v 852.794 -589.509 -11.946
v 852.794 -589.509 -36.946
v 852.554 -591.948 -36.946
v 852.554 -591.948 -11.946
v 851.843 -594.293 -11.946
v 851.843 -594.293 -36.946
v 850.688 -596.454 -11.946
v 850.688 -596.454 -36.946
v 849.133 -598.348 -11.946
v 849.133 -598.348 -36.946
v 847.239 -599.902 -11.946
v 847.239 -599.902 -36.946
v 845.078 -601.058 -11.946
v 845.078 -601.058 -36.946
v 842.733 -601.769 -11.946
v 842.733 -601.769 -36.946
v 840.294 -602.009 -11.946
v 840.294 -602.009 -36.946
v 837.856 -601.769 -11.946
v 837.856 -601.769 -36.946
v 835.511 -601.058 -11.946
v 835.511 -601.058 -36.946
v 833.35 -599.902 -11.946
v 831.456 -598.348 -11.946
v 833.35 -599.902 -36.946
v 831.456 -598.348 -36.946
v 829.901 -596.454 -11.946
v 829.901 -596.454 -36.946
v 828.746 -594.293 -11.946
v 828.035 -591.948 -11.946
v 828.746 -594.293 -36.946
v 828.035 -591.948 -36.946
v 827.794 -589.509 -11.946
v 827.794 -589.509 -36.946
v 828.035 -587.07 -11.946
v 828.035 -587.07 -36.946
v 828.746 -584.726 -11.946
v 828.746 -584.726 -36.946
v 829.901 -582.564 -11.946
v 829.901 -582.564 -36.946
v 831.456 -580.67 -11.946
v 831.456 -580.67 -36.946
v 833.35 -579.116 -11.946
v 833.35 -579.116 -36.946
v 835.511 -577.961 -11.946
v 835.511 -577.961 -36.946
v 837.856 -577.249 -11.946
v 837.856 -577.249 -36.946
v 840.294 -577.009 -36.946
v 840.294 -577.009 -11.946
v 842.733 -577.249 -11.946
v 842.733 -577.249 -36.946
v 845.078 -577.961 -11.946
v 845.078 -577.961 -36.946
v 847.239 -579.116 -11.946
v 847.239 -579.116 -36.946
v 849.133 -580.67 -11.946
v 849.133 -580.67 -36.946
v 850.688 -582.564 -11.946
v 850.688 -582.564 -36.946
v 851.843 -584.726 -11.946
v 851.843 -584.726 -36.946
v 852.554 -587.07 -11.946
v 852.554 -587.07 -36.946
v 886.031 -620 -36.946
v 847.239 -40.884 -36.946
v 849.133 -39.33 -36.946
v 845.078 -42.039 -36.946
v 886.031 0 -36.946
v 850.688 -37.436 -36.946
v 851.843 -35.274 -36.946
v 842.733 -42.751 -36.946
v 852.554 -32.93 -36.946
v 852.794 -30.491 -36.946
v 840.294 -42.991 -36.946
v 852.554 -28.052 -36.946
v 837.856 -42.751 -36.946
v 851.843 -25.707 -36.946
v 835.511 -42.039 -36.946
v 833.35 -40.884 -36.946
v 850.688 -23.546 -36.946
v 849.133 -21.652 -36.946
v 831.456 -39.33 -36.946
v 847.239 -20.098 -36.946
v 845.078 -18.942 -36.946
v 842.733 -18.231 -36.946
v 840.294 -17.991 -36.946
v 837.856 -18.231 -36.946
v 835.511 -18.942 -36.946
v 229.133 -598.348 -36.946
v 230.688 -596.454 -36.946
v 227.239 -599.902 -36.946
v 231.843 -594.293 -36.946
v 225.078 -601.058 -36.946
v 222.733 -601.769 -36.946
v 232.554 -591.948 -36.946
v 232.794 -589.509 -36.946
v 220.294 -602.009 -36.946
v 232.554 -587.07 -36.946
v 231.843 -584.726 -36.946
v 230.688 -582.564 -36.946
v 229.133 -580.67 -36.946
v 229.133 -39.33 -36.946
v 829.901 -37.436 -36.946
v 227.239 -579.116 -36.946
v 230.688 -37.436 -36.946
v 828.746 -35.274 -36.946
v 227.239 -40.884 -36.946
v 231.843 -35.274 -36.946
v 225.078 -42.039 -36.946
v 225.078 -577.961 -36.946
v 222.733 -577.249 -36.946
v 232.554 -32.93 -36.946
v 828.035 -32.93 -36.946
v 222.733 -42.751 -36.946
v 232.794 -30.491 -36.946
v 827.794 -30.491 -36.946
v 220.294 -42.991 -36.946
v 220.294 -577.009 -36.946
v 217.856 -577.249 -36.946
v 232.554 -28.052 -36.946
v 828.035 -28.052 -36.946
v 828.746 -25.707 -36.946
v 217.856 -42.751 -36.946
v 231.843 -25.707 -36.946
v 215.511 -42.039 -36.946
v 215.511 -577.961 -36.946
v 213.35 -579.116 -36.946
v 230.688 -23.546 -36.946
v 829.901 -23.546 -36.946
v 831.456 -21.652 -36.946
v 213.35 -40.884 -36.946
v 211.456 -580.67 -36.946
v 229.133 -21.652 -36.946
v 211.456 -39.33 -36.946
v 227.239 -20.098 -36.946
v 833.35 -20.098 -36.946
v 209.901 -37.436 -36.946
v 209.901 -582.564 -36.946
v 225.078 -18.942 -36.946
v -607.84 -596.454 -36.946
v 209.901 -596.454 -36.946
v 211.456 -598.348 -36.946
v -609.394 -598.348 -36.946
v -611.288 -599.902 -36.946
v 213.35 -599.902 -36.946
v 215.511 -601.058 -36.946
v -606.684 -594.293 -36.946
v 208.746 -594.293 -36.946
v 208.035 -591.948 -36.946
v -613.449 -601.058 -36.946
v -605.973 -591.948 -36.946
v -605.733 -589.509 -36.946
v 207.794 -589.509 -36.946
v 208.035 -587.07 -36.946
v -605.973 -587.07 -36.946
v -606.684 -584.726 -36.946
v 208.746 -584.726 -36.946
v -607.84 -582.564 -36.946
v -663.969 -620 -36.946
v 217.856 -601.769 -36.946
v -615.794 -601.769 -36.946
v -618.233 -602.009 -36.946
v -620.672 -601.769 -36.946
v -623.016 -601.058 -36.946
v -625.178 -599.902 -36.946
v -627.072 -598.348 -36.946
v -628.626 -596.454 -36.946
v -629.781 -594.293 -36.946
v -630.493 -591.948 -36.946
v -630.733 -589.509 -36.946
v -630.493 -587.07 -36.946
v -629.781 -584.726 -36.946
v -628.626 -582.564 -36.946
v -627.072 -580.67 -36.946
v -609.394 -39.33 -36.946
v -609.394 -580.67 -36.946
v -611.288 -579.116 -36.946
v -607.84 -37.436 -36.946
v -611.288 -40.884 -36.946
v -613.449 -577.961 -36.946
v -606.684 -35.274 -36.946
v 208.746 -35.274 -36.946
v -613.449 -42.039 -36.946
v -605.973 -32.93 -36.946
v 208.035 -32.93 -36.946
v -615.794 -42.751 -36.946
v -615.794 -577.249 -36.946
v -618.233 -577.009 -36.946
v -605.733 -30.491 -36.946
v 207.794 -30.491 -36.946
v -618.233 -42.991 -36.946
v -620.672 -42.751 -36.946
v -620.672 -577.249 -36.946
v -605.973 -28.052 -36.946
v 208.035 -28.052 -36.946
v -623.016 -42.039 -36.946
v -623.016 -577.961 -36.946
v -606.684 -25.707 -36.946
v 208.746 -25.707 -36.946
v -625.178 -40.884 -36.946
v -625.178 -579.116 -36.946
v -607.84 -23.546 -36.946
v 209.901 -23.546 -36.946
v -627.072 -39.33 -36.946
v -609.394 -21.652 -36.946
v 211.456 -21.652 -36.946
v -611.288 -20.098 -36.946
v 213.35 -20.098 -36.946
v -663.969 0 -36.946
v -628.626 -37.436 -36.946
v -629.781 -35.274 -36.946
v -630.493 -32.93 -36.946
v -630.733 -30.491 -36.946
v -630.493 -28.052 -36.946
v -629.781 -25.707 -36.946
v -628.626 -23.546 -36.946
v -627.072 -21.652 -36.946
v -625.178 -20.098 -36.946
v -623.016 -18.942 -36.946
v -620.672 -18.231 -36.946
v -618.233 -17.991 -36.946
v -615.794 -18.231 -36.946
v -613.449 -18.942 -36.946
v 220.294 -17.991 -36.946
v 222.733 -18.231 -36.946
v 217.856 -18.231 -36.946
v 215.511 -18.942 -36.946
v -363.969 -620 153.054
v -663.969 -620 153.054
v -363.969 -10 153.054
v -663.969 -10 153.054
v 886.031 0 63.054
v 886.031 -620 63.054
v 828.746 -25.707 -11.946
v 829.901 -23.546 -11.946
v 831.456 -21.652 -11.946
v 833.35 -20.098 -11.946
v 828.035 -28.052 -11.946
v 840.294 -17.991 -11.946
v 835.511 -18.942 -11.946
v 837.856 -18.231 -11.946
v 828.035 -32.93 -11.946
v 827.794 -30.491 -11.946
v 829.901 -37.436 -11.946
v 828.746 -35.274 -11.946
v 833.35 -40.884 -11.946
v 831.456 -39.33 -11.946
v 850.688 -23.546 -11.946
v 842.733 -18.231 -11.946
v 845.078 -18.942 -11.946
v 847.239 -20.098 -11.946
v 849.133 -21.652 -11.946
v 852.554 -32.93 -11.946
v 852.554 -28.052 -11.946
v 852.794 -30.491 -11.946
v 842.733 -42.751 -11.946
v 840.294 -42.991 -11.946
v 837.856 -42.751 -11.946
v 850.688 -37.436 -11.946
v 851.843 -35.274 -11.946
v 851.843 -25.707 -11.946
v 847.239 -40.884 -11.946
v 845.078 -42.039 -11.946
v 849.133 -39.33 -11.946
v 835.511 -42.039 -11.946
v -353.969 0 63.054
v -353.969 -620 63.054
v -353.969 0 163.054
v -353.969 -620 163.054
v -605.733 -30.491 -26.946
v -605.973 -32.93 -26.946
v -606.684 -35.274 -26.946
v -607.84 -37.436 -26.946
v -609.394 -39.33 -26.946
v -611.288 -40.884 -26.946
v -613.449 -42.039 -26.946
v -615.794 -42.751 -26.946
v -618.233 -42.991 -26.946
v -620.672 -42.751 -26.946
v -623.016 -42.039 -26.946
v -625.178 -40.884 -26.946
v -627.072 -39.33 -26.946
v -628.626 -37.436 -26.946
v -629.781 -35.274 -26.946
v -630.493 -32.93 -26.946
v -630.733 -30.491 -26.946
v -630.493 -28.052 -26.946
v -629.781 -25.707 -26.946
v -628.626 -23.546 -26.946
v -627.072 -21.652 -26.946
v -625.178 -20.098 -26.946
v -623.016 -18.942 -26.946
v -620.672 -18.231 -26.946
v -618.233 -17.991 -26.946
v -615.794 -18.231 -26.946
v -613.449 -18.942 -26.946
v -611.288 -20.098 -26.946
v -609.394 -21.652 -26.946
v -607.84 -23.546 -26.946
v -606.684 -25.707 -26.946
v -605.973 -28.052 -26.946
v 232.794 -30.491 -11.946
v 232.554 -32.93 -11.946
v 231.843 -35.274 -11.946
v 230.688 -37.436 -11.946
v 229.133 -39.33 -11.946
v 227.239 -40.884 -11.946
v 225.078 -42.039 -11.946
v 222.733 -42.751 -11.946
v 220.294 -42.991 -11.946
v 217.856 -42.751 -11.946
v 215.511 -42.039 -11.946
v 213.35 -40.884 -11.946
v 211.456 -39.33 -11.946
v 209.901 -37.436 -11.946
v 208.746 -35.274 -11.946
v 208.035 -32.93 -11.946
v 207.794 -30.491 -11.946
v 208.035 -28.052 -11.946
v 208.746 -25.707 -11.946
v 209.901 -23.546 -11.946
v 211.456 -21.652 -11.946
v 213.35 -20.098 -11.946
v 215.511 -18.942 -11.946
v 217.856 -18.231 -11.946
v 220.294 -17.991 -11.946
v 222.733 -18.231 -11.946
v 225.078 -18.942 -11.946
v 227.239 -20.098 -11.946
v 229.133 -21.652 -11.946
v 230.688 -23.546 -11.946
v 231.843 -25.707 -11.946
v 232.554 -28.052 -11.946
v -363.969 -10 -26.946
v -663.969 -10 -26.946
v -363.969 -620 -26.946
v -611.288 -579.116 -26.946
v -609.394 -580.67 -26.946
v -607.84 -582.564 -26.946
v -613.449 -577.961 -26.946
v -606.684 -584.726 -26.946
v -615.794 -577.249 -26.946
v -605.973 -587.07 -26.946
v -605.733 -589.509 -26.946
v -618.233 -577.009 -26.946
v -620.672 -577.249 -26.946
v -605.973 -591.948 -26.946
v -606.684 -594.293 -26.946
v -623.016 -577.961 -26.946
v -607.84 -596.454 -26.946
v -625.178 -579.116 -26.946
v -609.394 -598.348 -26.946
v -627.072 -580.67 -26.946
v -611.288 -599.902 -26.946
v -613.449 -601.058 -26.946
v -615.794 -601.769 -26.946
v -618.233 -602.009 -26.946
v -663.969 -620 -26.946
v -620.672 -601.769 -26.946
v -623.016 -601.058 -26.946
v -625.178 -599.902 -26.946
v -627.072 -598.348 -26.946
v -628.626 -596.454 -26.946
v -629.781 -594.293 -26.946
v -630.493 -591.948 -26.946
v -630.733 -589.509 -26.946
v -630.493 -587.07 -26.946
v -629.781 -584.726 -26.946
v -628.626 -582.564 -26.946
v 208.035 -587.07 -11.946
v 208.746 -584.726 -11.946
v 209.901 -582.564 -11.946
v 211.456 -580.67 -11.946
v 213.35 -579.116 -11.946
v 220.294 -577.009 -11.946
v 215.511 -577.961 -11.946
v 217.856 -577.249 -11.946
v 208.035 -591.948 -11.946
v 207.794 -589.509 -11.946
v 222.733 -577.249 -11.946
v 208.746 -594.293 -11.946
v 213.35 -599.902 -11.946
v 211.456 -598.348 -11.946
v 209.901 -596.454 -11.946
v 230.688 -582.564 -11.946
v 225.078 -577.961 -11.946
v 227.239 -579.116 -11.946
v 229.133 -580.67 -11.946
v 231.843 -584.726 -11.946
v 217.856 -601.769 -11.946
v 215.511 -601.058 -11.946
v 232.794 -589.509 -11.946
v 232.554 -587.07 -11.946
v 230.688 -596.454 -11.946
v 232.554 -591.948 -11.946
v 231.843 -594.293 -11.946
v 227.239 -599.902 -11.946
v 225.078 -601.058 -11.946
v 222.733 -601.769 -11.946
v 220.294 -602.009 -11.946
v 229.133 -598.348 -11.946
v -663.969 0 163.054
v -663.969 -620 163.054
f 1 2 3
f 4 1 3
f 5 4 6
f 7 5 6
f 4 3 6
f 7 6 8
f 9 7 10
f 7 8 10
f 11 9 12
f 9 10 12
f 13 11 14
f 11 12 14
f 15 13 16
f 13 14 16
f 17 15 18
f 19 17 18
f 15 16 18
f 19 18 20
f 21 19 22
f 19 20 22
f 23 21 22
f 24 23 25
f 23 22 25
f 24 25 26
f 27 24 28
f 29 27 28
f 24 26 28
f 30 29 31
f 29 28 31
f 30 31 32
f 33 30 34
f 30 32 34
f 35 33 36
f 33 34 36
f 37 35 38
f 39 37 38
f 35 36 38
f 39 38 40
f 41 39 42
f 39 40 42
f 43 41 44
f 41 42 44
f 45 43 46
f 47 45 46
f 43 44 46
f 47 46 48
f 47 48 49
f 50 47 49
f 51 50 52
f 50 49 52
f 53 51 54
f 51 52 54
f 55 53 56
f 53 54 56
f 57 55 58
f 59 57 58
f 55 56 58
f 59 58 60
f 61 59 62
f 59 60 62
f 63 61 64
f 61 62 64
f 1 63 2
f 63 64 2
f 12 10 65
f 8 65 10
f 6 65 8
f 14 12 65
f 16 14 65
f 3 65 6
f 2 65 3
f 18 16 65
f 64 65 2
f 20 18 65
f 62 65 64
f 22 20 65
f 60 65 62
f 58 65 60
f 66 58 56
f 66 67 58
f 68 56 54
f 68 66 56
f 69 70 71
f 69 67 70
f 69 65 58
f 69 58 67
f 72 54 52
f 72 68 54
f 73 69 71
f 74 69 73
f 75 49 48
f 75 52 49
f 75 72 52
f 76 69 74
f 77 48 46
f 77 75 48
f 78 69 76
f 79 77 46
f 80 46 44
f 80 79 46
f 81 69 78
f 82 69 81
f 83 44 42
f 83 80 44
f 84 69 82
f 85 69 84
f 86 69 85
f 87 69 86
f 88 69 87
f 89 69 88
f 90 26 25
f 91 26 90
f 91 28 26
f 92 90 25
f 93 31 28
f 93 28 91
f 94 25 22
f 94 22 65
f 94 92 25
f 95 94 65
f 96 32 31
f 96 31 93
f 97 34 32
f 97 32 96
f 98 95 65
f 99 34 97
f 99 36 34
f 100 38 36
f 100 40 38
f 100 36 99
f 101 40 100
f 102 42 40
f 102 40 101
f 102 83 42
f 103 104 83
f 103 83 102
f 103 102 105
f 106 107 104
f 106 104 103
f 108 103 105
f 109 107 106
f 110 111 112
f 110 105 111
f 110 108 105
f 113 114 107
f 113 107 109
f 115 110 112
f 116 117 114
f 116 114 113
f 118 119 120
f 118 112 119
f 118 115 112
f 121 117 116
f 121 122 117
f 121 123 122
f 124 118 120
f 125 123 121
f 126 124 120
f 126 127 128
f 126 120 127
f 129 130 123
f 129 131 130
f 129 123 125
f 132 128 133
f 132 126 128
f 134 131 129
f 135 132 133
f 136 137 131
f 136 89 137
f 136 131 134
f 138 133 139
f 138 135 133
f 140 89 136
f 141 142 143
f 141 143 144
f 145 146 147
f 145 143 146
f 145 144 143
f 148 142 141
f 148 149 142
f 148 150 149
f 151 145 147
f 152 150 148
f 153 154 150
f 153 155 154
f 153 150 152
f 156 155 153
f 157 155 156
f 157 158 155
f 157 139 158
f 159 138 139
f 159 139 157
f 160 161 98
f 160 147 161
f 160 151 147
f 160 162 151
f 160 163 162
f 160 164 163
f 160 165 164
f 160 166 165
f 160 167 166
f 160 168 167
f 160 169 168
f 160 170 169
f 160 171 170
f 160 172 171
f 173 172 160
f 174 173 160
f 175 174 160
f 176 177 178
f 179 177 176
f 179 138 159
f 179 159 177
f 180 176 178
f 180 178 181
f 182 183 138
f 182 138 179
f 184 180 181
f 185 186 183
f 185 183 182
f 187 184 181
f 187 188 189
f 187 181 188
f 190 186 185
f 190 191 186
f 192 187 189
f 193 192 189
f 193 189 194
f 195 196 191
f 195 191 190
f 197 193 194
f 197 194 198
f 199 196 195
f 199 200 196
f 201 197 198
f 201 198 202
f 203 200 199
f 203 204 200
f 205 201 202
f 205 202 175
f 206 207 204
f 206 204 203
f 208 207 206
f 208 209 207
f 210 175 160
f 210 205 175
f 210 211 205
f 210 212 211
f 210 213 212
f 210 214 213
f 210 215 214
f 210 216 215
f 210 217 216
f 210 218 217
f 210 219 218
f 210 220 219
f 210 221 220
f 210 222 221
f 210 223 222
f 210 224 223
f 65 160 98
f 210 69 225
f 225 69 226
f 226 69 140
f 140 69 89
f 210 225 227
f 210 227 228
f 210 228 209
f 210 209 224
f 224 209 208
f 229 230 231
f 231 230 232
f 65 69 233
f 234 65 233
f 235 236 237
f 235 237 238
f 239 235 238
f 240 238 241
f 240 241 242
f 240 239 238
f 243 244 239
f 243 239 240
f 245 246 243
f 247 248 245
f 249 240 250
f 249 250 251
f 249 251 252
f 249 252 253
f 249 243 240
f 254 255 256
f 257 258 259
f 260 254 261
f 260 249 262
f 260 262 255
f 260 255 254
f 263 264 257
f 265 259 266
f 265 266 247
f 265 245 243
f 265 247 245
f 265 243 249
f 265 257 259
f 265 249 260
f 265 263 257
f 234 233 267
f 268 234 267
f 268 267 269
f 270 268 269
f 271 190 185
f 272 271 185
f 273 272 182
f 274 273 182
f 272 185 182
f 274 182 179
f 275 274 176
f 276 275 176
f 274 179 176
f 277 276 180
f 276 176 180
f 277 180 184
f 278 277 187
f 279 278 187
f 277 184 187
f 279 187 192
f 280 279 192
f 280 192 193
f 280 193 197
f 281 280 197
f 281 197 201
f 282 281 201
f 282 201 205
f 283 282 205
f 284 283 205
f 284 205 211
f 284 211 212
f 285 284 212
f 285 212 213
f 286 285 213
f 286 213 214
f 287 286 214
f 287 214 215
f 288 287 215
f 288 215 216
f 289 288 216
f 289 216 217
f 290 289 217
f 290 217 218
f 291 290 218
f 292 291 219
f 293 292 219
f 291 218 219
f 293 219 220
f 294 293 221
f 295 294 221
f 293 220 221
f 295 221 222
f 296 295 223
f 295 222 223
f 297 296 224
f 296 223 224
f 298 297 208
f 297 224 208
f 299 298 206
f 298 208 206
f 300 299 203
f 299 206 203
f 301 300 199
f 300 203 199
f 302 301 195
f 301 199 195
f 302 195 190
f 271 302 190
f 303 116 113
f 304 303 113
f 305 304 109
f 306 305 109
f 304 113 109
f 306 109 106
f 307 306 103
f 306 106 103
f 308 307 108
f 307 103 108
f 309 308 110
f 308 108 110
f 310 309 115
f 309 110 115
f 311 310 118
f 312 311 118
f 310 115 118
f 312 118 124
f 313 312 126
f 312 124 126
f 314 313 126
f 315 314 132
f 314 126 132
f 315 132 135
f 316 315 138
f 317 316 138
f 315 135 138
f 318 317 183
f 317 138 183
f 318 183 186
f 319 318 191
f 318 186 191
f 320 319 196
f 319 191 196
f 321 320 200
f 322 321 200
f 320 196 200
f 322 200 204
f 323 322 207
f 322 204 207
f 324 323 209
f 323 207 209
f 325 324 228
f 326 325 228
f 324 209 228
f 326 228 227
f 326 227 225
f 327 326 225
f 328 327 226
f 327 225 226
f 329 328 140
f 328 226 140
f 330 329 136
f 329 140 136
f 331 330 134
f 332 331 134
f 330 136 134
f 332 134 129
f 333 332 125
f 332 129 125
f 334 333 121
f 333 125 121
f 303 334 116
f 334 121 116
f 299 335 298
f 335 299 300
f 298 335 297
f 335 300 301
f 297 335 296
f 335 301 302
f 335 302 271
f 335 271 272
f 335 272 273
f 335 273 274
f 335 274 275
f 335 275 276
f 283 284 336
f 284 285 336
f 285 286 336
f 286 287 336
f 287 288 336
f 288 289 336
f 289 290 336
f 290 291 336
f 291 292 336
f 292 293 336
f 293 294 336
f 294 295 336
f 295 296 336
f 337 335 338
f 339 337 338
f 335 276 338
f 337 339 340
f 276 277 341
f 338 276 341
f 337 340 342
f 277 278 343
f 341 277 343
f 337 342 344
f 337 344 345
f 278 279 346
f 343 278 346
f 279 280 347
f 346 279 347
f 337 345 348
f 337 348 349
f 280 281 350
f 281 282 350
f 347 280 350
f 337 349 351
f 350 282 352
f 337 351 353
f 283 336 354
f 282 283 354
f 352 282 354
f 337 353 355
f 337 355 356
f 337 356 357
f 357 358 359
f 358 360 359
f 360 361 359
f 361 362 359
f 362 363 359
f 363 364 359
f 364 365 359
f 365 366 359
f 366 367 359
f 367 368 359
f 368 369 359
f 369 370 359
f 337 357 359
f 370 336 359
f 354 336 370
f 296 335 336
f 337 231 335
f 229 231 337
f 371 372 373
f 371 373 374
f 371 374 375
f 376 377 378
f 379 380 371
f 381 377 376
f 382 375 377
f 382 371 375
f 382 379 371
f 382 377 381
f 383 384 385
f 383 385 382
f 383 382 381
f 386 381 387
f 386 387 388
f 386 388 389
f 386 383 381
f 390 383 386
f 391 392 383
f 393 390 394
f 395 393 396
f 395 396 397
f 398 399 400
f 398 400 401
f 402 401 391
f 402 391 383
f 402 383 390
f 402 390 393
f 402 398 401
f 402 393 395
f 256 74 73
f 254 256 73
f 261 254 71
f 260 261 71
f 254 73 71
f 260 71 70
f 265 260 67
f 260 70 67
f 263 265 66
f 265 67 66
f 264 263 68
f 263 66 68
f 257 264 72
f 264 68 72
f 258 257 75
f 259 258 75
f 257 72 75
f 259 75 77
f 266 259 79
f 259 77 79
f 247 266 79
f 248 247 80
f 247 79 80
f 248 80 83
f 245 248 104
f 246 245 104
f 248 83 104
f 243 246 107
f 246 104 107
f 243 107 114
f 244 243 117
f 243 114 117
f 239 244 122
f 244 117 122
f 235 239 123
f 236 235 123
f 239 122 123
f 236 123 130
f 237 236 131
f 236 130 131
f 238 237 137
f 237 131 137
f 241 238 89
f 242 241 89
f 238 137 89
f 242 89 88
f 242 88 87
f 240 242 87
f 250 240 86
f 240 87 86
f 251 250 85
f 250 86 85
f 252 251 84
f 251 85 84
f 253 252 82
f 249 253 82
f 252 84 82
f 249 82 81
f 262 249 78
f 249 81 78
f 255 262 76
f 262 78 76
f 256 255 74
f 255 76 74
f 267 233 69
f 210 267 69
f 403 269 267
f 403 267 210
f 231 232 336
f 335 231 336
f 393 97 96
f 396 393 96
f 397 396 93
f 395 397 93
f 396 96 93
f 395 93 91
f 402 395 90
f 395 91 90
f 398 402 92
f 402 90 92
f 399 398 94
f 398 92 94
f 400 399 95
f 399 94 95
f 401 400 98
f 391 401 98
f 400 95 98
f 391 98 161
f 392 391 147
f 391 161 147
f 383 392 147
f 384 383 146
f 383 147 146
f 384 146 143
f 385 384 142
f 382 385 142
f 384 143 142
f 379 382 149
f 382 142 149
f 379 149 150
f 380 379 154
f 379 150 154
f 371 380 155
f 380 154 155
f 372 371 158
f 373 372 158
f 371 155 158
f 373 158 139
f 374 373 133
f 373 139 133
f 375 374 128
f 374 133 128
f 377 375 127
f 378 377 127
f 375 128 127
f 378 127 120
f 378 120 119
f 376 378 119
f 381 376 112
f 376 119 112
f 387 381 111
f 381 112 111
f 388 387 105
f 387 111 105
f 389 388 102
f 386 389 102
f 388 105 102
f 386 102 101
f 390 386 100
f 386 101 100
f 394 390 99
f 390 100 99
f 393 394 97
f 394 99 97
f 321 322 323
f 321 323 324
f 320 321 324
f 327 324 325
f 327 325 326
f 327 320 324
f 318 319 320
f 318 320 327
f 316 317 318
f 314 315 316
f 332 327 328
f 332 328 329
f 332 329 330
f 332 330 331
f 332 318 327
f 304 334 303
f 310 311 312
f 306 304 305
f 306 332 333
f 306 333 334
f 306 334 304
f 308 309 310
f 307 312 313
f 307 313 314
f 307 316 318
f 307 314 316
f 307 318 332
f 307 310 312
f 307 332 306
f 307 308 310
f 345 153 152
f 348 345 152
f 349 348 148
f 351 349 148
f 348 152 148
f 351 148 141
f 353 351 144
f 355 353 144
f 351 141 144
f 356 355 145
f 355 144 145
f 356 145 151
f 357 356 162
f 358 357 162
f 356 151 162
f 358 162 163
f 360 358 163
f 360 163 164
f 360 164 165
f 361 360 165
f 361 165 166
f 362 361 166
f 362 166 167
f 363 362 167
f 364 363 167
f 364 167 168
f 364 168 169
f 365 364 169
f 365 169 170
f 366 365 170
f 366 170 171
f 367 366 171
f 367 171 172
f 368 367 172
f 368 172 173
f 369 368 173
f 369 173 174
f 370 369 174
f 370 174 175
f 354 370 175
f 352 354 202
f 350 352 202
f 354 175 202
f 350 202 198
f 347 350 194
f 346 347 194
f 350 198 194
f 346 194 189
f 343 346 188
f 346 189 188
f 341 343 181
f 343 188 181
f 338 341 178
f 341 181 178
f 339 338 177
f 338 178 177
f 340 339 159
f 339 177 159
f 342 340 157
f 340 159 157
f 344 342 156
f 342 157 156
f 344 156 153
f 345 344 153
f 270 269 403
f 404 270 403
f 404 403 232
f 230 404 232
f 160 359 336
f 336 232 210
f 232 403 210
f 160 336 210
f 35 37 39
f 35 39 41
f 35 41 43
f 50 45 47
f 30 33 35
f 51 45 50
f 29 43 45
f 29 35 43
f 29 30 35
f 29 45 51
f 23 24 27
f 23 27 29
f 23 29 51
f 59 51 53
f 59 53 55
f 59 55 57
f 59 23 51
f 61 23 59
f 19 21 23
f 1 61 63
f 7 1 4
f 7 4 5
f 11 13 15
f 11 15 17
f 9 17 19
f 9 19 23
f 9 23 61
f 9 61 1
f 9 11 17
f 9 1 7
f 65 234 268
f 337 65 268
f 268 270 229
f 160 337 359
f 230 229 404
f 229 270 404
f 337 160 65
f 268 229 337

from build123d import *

# Parameters (mm, degrees)
F1_DEPTH = 620
F2_R     = 12.5
F3_DEPTH = 25
F5_DEPTH = 300
F6_W     = 620
F6_H     = 100
F7_DEPTH = 620
F8_R     = 12.5
F9_DEPTH = 25


with BuildPart() as f1:
    # F0 (on Front) → F1 (new body)
    with BuildSketch(Plane.XZ):
        Polygon((266.030722, -36.945744), (266.030722, 63.054256), (-353.969278, 63.054256), (-353.969278, 163.054256), (-663.969278, 163.054256), (-663.969278, -36.945744), (-353.969278, -36.945744), align=None)
    extrude(amount=F1_DEPTH)

    # F2 (on face) → F3 (cut)
    with BuildSketch(Plane(origin=(0, 0, -36.945744), x_dir=(1, 0, 0), z_dir=(0, 0, -1))):
        with Locations((-618.232899, 589.50908)):
            Circle(F2_R)
        with Locations((-618.232899, 30.49092)):
            Circle(F2_R)
        with Locations((220.294342, 589.50908)):
            Circle(F2_R)
        with Locations((220.294342, 30.49092)):
            Circle(F2_R)
    extrude(amount=-F3_DEPTH, mode=Mode.SUBTRACT)

    # F4 (on face) → F5 (cut)
    with BuildSketch(Plane(origin=(-663.969278, 0, 0), x_dir=(0, -1, 0), z_dir=(-1, 0, 0))):
        Polygon((634.776235, 153.054256), (610, 153.054256), (10, 153.054256), (10, -26.945745), (610, -26.945745), (634.776235, -26.945745), align=None)
    extrude(amount=-F5_DEPTH, mode=Mode.SUBTRACT)

    # F6 (on face) → F7 (join, through all)
    with BuildSketch(Plane(origin=(0, 0, 0), x_dir=(-1, 0, 0), z_dir=(0, 1, 0))):
        with Locations((-576.030722, 13.054256)):
            Rectangle(F6_W, F6_H)
    extrude(amount=-F7_DEPTH)

    # F8 (on face) → F9 (cut, through all)
    with BuildSketch(Plane(origin=(0, 0, -36.945744), x_dir=(1, 0, 0), z_dir=(0, 0, -1))):
        with Locations((840.294342, 589.50908)):
            Circle(F8_R)
        with Locations((840.294342, 30.49092)):
            Circle(F8_R)
    extrude(amount=-F9_DEPTH, mode=Mode.SUBTRACT)


solid = f1.part
